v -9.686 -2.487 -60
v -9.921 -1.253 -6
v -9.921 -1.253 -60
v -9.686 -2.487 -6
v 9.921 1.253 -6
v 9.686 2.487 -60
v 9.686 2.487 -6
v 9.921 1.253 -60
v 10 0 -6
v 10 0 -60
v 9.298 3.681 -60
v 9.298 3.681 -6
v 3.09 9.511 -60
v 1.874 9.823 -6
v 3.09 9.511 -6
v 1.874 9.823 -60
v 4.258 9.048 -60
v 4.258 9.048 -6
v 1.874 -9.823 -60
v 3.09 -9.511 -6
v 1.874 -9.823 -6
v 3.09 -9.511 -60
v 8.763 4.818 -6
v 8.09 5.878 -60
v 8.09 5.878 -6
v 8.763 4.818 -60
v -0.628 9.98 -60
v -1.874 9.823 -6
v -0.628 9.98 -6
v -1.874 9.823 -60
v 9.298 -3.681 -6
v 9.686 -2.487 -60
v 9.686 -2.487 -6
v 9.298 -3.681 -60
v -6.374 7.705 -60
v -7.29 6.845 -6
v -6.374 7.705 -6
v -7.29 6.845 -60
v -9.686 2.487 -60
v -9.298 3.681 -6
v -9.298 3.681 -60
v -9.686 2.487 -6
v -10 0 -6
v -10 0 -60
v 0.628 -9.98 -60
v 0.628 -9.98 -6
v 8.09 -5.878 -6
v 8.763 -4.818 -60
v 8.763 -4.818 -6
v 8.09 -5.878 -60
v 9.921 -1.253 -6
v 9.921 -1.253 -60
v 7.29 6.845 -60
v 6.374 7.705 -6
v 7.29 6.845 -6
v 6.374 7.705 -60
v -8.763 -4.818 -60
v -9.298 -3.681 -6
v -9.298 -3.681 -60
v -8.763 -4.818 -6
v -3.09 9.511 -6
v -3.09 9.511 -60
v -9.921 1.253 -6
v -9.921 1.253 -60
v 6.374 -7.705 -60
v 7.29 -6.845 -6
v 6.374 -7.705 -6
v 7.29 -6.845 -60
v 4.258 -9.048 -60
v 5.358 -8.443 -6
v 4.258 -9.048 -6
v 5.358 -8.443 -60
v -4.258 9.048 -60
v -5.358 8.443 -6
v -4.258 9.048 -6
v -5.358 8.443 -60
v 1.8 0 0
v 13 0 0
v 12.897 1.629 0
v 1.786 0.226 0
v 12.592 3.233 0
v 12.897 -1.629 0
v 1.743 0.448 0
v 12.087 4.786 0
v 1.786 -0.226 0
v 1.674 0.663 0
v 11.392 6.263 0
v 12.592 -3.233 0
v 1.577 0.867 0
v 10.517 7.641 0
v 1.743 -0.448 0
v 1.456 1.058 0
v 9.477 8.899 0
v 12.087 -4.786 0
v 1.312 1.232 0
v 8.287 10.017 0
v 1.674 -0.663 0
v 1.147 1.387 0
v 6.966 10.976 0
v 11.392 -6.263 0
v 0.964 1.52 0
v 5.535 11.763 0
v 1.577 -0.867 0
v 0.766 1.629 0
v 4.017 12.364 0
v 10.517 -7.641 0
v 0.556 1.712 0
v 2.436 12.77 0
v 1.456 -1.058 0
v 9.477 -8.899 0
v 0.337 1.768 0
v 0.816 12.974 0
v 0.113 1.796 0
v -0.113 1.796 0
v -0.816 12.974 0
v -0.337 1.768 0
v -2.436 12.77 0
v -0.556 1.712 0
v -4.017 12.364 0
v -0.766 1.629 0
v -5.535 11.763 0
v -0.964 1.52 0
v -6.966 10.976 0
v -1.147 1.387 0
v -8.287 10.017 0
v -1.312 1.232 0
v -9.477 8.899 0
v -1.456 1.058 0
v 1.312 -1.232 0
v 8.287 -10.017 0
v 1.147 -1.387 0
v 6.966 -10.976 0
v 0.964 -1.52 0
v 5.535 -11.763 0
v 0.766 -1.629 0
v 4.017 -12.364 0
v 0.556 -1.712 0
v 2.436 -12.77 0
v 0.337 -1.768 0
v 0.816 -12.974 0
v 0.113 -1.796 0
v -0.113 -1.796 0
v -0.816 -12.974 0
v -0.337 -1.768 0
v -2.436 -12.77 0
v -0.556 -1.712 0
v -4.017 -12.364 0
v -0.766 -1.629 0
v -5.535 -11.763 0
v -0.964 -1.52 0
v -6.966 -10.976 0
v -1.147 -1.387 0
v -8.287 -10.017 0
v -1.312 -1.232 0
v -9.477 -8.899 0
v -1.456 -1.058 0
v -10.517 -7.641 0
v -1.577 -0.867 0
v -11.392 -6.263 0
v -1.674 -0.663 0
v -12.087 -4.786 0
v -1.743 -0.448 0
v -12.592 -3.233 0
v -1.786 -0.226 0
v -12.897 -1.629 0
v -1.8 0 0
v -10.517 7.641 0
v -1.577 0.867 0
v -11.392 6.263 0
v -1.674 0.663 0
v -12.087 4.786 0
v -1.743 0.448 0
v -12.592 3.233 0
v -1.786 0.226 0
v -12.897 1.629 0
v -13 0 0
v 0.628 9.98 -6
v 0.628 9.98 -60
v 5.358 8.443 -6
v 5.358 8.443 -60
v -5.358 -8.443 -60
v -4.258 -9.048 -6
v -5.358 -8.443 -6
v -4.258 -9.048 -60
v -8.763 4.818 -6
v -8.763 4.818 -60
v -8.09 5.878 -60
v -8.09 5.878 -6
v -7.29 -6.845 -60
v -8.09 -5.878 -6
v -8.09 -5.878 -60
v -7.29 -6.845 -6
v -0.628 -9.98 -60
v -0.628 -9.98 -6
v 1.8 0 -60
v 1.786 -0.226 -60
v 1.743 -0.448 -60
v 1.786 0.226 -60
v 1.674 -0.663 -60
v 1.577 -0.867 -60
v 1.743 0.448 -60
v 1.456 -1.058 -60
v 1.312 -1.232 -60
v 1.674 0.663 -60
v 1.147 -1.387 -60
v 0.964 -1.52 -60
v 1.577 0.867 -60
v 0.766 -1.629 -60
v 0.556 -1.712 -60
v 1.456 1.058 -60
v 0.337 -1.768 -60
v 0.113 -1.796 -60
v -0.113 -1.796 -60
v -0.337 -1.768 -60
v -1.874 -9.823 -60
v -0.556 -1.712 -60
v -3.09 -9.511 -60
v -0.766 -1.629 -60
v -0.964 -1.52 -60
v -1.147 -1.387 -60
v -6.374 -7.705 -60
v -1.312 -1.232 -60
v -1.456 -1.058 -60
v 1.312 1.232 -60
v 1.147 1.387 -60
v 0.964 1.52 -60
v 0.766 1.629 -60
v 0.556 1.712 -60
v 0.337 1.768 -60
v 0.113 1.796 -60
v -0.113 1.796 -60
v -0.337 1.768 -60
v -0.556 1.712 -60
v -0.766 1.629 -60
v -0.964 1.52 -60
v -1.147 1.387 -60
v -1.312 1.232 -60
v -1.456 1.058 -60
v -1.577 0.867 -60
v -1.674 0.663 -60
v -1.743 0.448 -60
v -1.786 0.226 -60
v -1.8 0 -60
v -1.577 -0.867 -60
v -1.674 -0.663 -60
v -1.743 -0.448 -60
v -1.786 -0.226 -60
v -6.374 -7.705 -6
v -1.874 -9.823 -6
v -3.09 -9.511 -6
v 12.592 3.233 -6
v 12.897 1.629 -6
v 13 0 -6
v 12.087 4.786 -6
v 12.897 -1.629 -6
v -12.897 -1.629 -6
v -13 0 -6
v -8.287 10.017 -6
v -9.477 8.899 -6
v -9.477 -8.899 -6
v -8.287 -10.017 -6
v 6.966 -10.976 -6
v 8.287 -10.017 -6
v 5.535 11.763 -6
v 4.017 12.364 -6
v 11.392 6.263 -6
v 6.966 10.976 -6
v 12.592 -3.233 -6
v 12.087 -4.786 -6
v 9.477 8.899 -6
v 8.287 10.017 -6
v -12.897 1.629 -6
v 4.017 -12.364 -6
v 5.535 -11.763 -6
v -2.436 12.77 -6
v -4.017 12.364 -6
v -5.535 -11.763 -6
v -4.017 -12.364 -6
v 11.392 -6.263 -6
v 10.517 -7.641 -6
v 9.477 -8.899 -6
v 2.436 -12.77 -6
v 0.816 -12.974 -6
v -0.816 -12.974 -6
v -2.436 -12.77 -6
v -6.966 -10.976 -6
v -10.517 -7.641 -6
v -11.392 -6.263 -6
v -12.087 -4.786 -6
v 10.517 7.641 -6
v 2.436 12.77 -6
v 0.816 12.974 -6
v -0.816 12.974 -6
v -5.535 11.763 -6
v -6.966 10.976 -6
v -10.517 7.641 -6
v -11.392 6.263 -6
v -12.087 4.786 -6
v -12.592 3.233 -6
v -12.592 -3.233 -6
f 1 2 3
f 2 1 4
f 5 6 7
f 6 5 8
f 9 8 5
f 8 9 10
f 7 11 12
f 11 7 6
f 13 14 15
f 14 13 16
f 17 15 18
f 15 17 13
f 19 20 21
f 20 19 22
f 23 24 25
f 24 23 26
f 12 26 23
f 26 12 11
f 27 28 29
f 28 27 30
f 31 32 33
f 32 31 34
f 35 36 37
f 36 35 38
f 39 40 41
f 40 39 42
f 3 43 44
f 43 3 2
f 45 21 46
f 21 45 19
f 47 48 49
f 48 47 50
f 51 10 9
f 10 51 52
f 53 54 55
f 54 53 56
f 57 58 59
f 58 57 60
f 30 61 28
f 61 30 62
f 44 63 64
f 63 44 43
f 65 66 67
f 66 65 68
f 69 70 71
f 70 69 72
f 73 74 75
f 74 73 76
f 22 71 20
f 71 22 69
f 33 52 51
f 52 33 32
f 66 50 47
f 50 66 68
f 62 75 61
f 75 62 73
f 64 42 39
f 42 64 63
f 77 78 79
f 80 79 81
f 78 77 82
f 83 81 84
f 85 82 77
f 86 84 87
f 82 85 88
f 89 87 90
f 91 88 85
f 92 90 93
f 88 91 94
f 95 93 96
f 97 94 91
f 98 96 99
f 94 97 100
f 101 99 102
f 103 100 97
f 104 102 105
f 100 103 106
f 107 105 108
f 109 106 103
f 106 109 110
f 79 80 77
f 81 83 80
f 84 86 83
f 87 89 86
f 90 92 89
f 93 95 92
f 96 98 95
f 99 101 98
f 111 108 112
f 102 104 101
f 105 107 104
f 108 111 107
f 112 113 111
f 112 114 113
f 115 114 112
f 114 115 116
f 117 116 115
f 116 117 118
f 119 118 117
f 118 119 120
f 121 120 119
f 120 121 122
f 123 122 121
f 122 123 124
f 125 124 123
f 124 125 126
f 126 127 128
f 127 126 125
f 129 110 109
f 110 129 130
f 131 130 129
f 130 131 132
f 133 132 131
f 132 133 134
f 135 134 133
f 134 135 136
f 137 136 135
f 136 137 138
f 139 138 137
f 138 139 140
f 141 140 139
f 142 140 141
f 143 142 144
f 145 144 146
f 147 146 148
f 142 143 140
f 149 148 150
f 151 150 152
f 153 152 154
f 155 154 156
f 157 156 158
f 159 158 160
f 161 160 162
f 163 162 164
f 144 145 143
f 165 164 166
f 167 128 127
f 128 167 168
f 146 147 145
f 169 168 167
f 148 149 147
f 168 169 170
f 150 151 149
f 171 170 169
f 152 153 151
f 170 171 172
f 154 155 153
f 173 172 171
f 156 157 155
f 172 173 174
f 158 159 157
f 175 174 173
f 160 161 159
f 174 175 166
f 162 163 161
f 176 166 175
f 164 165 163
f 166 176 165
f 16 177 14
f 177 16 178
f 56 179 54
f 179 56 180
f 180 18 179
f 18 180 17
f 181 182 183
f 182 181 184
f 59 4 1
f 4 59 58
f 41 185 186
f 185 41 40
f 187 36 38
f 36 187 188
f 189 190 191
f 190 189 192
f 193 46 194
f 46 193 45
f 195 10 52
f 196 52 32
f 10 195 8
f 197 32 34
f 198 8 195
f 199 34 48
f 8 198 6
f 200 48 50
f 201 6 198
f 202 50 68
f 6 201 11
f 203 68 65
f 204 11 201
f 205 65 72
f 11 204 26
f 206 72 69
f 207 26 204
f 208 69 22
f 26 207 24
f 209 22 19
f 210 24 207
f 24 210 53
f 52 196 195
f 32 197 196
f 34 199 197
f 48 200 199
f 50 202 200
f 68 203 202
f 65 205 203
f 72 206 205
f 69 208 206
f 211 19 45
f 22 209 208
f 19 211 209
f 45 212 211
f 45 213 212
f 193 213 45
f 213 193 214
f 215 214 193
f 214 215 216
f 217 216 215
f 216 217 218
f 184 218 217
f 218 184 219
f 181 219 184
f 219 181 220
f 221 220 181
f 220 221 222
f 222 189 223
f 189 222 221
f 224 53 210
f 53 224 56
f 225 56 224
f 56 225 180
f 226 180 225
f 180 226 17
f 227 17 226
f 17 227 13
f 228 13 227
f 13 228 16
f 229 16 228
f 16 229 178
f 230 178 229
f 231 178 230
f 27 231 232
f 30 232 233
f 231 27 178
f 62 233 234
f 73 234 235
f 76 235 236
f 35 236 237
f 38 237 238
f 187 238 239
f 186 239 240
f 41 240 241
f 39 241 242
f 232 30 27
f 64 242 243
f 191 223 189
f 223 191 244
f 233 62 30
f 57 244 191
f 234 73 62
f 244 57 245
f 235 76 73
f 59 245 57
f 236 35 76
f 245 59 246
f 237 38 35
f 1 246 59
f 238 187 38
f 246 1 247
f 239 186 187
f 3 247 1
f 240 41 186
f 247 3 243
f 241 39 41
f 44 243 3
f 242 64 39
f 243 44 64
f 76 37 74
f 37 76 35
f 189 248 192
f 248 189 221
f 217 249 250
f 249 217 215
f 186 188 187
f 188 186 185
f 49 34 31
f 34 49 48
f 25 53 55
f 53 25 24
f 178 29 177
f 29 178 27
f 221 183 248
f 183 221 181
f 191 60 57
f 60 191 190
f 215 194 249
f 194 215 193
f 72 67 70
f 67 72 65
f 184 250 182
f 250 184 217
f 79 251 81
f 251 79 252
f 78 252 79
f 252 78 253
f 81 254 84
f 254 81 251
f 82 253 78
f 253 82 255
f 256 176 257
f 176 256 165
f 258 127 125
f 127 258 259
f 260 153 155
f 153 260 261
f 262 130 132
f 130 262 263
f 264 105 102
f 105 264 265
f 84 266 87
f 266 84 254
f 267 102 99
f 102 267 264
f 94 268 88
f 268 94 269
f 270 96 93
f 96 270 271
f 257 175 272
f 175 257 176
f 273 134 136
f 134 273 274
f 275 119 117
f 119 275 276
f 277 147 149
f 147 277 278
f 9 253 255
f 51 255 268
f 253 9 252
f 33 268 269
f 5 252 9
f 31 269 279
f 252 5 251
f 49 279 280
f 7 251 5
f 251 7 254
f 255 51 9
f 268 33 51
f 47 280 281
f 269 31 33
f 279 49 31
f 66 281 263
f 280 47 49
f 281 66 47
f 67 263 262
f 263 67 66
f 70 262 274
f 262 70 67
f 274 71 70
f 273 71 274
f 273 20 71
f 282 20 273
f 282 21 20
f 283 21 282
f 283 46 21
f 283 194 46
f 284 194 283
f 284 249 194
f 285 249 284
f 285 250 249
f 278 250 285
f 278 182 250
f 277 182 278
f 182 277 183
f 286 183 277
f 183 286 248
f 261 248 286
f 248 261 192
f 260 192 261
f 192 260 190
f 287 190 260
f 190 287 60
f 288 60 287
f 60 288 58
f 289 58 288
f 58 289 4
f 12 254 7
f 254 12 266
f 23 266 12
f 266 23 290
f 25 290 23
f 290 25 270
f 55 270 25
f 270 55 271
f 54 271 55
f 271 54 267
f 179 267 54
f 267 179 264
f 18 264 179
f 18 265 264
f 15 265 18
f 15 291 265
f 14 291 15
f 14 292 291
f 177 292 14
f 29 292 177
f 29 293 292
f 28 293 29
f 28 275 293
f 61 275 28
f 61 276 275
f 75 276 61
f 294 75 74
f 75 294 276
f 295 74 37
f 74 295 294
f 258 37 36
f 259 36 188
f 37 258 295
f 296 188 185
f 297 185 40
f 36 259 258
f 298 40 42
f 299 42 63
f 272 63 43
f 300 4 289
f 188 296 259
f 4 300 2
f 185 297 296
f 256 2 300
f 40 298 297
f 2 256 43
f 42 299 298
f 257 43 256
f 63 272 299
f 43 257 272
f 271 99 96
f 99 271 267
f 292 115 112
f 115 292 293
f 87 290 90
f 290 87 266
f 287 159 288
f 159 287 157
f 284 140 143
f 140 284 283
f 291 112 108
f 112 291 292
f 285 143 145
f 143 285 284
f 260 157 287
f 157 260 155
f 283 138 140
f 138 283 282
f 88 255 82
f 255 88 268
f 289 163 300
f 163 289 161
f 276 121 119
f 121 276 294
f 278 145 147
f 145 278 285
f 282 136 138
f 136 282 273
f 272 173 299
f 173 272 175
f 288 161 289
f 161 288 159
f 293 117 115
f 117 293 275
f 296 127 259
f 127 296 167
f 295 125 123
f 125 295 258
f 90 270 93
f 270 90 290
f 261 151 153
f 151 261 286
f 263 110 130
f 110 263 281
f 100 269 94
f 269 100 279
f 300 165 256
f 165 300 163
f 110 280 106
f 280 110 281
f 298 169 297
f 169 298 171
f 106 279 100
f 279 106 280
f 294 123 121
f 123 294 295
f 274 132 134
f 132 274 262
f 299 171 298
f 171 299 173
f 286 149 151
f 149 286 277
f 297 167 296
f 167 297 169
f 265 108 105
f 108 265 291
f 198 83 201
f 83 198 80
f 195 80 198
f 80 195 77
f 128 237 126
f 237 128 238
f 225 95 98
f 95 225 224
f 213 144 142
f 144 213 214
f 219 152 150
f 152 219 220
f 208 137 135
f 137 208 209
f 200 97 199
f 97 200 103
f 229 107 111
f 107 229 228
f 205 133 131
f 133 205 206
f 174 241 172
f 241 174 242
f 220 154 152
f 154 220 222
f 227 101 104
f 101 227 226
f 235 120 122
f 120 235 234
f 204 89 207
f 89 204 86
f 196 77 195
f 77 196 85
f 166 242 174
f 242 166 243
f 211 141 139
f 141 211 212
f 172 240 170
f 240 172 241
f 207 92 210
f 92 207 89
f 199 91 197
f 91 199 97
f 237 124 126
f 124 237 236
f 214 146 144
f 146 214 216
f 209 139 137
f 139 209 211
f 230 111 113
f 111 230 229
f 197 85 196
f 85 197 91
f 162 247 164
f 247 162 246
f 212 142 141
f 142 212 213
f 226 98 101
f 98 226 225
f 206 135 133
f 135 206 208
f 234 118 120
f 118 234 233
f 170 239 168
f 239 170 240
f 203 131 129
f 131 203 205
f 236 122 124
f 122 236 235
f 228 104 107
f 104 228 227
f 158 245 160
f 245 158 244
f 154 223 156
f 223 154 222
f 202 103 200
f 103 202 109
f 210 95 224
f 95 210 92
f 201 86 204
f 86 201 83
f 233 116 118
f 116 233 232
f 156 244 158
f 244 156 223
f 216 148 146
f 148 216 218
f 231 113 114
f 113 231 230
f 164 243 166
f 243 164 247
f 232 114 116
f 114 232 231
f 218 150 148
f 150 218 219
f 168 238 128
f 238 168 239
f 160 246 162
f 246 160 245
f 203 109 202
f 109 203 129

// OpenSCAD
$fn = 50;


difference() {
	union() {
		translate(v = [0, 0, -60.0000000000]) {
			cylinder(h = 60, r = 10.0000000000);
		}
		translate(v = [0, 0, -6.0000000000]) {
			cylinder(h = 6, r = 13.0000000000);
		}
	}
	union() {
		#translate(v = [0, 0, -60]) {
			cylinder(h = 60, r = 1.8000000000);
		}
	}
}
